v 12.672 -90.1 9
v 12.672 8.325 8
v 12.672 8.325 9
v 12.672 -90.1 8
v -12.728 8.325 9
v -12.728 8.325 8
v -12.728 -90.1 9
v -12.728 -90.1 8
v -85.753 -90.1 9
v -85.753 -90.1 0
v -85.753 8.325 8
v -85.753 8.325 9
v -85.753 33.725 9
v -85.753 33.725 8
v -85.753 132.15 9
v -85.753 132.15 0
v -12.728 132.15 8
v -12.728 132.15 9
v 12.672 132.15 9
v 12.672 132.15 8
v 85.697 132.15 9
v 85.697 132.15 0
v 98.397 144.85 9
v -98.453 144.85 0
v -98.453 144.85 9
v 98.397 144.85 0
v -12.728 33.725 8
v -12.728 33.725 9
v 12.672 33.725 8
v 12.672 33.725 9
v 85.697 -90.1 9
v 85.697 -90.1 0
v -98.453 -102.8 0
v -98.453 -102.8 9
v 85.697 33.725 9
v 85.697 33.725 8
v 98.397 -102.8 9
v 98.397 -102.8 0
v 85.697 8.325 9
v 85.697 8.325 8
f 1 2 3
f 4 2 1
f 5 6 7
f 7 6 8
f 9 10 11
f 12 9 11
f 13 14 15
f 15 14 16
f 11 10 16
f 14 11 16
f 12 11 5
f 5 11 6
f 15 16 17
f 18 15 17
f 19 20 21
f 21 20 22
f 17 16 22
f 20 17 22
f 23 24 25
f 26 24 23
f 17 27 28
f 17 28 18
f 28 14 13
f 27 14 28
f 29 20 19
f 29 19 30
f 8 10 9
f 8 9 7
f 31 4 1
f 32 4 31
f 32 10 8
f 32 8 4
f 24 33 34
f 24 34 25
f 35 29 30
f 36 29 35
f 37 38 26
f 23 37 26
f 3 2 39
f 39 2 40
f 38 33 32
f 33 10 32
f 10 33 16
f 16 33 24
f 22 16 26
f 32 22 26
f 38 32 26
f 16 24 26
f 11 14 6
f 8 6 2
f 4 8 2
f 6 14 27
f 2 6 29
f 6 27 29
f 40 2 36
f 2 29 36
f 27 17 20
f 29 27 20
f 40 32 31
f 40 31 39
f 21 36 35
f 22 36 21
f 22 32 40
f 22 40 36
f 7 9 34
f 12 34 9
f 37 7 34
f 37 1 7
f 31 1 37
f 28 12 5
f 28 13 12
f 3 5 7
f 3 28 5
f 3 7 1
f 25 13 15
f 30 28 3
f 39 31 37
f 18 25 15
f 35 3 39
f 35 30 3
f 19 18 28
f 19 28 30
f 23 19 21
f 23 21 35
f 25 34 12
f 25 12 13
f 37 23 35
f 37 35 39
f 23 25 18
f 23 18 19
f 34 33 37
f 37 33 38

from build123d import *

# Parameters (mm, degrees)
F0_W      = 196.85
F0_H      = 247.65
F0_W_2    = 171.45
F0_H_2    = 222.25
F1_DEPTH  = 9
F2_DEPTH  = 8
F3_W      = 73.025
F3_H      = 98.425
F4_DEPTH  = 9
F5_W      = 73.025
F5_H      = 98.425
F6_DEPTH  = 10
F7_W      = 73.025
F7_H      = 98.425
F8_DEPTH  = 10
F9_W      = 73.025
F9_H      = 98.425
F10_DEPTH = 10


with BuildPart() as f1:
    # F0 (on Top) → F1 (new body)
    with BuildSketch(Plane.XY):
        with Locations((-0.0278223306, 21.0249534539)):
            Rectangle(F0_W, F0_H)
        with Locations((-0.0278223306, 21.0249534539)):
            Rectangle(F0_W_2, F0_H_2, mode=Mode.SUBTRACT)
        with Locations((-0.0278223306, 21.0249534539)):
            Rectangle(F0_W_2, F0_H_2)
    extrude(amount=F1_DEPTH)

    # F0 (on Top) → F2 (cut)
    with BuildSketch(Plane.XY):
        with Locations((-0.0278223306, 21.0249534539)):
            Rectangle(F0_W_2, F0_H_2)
    extrude(amount=F2_DEPTH, mode=Mode.SUBTRACT)

    # F3 (on face) → F4 (cut)
    with BuildSketch(Plane.XY):
        with Locations((-49.2403223306, 82.9374534539)):
            Rectangle(F3_W, F3_H)
    extrude(amount=F4_DEPTH, mode=Mode.SUBTRACT)

    # F5 (on face) → F6 (cut)
    with BuildSketch(Plane(origin=(0, 0, 8), x_dir=(1, 0, 0), z_dir=(0, 0, -1))):
        with Locations((-49.2403223306, 40.8875465461)):
            Rectangle(F5_W, F5_H)
    extrude(amount=-F6_DEPTH, mode=Mode.SUBTRACT)

    # F7 (on face) → F8 (cut)
    with BuildSketch(Plane(origin=(0, 0, 8), x_dir=(1, 0, 0), z_dir=(0, 0, -1))):
        with Locations((49.1846776694, -82.9374534539)):
            Rectangle(F7_W, F7_H)
    extrude(amount=-F8_DEPTH, mode=Mode.SUBTRACT)

    # F9 (on face) → F10 (cut)
    with BuildSketch(Plane(origin=(0, 0, 8), x_dir=(1, 0, 0), z_dir=(0, 0, -1))):
        with Locations((49.1846776694, 40.8875465461)):
            Rectangle(F9_W, F9_H)
    extrude(amount=-F10_DEPTH, mode=Mode.SUBTRACT)


solid = f1.part
